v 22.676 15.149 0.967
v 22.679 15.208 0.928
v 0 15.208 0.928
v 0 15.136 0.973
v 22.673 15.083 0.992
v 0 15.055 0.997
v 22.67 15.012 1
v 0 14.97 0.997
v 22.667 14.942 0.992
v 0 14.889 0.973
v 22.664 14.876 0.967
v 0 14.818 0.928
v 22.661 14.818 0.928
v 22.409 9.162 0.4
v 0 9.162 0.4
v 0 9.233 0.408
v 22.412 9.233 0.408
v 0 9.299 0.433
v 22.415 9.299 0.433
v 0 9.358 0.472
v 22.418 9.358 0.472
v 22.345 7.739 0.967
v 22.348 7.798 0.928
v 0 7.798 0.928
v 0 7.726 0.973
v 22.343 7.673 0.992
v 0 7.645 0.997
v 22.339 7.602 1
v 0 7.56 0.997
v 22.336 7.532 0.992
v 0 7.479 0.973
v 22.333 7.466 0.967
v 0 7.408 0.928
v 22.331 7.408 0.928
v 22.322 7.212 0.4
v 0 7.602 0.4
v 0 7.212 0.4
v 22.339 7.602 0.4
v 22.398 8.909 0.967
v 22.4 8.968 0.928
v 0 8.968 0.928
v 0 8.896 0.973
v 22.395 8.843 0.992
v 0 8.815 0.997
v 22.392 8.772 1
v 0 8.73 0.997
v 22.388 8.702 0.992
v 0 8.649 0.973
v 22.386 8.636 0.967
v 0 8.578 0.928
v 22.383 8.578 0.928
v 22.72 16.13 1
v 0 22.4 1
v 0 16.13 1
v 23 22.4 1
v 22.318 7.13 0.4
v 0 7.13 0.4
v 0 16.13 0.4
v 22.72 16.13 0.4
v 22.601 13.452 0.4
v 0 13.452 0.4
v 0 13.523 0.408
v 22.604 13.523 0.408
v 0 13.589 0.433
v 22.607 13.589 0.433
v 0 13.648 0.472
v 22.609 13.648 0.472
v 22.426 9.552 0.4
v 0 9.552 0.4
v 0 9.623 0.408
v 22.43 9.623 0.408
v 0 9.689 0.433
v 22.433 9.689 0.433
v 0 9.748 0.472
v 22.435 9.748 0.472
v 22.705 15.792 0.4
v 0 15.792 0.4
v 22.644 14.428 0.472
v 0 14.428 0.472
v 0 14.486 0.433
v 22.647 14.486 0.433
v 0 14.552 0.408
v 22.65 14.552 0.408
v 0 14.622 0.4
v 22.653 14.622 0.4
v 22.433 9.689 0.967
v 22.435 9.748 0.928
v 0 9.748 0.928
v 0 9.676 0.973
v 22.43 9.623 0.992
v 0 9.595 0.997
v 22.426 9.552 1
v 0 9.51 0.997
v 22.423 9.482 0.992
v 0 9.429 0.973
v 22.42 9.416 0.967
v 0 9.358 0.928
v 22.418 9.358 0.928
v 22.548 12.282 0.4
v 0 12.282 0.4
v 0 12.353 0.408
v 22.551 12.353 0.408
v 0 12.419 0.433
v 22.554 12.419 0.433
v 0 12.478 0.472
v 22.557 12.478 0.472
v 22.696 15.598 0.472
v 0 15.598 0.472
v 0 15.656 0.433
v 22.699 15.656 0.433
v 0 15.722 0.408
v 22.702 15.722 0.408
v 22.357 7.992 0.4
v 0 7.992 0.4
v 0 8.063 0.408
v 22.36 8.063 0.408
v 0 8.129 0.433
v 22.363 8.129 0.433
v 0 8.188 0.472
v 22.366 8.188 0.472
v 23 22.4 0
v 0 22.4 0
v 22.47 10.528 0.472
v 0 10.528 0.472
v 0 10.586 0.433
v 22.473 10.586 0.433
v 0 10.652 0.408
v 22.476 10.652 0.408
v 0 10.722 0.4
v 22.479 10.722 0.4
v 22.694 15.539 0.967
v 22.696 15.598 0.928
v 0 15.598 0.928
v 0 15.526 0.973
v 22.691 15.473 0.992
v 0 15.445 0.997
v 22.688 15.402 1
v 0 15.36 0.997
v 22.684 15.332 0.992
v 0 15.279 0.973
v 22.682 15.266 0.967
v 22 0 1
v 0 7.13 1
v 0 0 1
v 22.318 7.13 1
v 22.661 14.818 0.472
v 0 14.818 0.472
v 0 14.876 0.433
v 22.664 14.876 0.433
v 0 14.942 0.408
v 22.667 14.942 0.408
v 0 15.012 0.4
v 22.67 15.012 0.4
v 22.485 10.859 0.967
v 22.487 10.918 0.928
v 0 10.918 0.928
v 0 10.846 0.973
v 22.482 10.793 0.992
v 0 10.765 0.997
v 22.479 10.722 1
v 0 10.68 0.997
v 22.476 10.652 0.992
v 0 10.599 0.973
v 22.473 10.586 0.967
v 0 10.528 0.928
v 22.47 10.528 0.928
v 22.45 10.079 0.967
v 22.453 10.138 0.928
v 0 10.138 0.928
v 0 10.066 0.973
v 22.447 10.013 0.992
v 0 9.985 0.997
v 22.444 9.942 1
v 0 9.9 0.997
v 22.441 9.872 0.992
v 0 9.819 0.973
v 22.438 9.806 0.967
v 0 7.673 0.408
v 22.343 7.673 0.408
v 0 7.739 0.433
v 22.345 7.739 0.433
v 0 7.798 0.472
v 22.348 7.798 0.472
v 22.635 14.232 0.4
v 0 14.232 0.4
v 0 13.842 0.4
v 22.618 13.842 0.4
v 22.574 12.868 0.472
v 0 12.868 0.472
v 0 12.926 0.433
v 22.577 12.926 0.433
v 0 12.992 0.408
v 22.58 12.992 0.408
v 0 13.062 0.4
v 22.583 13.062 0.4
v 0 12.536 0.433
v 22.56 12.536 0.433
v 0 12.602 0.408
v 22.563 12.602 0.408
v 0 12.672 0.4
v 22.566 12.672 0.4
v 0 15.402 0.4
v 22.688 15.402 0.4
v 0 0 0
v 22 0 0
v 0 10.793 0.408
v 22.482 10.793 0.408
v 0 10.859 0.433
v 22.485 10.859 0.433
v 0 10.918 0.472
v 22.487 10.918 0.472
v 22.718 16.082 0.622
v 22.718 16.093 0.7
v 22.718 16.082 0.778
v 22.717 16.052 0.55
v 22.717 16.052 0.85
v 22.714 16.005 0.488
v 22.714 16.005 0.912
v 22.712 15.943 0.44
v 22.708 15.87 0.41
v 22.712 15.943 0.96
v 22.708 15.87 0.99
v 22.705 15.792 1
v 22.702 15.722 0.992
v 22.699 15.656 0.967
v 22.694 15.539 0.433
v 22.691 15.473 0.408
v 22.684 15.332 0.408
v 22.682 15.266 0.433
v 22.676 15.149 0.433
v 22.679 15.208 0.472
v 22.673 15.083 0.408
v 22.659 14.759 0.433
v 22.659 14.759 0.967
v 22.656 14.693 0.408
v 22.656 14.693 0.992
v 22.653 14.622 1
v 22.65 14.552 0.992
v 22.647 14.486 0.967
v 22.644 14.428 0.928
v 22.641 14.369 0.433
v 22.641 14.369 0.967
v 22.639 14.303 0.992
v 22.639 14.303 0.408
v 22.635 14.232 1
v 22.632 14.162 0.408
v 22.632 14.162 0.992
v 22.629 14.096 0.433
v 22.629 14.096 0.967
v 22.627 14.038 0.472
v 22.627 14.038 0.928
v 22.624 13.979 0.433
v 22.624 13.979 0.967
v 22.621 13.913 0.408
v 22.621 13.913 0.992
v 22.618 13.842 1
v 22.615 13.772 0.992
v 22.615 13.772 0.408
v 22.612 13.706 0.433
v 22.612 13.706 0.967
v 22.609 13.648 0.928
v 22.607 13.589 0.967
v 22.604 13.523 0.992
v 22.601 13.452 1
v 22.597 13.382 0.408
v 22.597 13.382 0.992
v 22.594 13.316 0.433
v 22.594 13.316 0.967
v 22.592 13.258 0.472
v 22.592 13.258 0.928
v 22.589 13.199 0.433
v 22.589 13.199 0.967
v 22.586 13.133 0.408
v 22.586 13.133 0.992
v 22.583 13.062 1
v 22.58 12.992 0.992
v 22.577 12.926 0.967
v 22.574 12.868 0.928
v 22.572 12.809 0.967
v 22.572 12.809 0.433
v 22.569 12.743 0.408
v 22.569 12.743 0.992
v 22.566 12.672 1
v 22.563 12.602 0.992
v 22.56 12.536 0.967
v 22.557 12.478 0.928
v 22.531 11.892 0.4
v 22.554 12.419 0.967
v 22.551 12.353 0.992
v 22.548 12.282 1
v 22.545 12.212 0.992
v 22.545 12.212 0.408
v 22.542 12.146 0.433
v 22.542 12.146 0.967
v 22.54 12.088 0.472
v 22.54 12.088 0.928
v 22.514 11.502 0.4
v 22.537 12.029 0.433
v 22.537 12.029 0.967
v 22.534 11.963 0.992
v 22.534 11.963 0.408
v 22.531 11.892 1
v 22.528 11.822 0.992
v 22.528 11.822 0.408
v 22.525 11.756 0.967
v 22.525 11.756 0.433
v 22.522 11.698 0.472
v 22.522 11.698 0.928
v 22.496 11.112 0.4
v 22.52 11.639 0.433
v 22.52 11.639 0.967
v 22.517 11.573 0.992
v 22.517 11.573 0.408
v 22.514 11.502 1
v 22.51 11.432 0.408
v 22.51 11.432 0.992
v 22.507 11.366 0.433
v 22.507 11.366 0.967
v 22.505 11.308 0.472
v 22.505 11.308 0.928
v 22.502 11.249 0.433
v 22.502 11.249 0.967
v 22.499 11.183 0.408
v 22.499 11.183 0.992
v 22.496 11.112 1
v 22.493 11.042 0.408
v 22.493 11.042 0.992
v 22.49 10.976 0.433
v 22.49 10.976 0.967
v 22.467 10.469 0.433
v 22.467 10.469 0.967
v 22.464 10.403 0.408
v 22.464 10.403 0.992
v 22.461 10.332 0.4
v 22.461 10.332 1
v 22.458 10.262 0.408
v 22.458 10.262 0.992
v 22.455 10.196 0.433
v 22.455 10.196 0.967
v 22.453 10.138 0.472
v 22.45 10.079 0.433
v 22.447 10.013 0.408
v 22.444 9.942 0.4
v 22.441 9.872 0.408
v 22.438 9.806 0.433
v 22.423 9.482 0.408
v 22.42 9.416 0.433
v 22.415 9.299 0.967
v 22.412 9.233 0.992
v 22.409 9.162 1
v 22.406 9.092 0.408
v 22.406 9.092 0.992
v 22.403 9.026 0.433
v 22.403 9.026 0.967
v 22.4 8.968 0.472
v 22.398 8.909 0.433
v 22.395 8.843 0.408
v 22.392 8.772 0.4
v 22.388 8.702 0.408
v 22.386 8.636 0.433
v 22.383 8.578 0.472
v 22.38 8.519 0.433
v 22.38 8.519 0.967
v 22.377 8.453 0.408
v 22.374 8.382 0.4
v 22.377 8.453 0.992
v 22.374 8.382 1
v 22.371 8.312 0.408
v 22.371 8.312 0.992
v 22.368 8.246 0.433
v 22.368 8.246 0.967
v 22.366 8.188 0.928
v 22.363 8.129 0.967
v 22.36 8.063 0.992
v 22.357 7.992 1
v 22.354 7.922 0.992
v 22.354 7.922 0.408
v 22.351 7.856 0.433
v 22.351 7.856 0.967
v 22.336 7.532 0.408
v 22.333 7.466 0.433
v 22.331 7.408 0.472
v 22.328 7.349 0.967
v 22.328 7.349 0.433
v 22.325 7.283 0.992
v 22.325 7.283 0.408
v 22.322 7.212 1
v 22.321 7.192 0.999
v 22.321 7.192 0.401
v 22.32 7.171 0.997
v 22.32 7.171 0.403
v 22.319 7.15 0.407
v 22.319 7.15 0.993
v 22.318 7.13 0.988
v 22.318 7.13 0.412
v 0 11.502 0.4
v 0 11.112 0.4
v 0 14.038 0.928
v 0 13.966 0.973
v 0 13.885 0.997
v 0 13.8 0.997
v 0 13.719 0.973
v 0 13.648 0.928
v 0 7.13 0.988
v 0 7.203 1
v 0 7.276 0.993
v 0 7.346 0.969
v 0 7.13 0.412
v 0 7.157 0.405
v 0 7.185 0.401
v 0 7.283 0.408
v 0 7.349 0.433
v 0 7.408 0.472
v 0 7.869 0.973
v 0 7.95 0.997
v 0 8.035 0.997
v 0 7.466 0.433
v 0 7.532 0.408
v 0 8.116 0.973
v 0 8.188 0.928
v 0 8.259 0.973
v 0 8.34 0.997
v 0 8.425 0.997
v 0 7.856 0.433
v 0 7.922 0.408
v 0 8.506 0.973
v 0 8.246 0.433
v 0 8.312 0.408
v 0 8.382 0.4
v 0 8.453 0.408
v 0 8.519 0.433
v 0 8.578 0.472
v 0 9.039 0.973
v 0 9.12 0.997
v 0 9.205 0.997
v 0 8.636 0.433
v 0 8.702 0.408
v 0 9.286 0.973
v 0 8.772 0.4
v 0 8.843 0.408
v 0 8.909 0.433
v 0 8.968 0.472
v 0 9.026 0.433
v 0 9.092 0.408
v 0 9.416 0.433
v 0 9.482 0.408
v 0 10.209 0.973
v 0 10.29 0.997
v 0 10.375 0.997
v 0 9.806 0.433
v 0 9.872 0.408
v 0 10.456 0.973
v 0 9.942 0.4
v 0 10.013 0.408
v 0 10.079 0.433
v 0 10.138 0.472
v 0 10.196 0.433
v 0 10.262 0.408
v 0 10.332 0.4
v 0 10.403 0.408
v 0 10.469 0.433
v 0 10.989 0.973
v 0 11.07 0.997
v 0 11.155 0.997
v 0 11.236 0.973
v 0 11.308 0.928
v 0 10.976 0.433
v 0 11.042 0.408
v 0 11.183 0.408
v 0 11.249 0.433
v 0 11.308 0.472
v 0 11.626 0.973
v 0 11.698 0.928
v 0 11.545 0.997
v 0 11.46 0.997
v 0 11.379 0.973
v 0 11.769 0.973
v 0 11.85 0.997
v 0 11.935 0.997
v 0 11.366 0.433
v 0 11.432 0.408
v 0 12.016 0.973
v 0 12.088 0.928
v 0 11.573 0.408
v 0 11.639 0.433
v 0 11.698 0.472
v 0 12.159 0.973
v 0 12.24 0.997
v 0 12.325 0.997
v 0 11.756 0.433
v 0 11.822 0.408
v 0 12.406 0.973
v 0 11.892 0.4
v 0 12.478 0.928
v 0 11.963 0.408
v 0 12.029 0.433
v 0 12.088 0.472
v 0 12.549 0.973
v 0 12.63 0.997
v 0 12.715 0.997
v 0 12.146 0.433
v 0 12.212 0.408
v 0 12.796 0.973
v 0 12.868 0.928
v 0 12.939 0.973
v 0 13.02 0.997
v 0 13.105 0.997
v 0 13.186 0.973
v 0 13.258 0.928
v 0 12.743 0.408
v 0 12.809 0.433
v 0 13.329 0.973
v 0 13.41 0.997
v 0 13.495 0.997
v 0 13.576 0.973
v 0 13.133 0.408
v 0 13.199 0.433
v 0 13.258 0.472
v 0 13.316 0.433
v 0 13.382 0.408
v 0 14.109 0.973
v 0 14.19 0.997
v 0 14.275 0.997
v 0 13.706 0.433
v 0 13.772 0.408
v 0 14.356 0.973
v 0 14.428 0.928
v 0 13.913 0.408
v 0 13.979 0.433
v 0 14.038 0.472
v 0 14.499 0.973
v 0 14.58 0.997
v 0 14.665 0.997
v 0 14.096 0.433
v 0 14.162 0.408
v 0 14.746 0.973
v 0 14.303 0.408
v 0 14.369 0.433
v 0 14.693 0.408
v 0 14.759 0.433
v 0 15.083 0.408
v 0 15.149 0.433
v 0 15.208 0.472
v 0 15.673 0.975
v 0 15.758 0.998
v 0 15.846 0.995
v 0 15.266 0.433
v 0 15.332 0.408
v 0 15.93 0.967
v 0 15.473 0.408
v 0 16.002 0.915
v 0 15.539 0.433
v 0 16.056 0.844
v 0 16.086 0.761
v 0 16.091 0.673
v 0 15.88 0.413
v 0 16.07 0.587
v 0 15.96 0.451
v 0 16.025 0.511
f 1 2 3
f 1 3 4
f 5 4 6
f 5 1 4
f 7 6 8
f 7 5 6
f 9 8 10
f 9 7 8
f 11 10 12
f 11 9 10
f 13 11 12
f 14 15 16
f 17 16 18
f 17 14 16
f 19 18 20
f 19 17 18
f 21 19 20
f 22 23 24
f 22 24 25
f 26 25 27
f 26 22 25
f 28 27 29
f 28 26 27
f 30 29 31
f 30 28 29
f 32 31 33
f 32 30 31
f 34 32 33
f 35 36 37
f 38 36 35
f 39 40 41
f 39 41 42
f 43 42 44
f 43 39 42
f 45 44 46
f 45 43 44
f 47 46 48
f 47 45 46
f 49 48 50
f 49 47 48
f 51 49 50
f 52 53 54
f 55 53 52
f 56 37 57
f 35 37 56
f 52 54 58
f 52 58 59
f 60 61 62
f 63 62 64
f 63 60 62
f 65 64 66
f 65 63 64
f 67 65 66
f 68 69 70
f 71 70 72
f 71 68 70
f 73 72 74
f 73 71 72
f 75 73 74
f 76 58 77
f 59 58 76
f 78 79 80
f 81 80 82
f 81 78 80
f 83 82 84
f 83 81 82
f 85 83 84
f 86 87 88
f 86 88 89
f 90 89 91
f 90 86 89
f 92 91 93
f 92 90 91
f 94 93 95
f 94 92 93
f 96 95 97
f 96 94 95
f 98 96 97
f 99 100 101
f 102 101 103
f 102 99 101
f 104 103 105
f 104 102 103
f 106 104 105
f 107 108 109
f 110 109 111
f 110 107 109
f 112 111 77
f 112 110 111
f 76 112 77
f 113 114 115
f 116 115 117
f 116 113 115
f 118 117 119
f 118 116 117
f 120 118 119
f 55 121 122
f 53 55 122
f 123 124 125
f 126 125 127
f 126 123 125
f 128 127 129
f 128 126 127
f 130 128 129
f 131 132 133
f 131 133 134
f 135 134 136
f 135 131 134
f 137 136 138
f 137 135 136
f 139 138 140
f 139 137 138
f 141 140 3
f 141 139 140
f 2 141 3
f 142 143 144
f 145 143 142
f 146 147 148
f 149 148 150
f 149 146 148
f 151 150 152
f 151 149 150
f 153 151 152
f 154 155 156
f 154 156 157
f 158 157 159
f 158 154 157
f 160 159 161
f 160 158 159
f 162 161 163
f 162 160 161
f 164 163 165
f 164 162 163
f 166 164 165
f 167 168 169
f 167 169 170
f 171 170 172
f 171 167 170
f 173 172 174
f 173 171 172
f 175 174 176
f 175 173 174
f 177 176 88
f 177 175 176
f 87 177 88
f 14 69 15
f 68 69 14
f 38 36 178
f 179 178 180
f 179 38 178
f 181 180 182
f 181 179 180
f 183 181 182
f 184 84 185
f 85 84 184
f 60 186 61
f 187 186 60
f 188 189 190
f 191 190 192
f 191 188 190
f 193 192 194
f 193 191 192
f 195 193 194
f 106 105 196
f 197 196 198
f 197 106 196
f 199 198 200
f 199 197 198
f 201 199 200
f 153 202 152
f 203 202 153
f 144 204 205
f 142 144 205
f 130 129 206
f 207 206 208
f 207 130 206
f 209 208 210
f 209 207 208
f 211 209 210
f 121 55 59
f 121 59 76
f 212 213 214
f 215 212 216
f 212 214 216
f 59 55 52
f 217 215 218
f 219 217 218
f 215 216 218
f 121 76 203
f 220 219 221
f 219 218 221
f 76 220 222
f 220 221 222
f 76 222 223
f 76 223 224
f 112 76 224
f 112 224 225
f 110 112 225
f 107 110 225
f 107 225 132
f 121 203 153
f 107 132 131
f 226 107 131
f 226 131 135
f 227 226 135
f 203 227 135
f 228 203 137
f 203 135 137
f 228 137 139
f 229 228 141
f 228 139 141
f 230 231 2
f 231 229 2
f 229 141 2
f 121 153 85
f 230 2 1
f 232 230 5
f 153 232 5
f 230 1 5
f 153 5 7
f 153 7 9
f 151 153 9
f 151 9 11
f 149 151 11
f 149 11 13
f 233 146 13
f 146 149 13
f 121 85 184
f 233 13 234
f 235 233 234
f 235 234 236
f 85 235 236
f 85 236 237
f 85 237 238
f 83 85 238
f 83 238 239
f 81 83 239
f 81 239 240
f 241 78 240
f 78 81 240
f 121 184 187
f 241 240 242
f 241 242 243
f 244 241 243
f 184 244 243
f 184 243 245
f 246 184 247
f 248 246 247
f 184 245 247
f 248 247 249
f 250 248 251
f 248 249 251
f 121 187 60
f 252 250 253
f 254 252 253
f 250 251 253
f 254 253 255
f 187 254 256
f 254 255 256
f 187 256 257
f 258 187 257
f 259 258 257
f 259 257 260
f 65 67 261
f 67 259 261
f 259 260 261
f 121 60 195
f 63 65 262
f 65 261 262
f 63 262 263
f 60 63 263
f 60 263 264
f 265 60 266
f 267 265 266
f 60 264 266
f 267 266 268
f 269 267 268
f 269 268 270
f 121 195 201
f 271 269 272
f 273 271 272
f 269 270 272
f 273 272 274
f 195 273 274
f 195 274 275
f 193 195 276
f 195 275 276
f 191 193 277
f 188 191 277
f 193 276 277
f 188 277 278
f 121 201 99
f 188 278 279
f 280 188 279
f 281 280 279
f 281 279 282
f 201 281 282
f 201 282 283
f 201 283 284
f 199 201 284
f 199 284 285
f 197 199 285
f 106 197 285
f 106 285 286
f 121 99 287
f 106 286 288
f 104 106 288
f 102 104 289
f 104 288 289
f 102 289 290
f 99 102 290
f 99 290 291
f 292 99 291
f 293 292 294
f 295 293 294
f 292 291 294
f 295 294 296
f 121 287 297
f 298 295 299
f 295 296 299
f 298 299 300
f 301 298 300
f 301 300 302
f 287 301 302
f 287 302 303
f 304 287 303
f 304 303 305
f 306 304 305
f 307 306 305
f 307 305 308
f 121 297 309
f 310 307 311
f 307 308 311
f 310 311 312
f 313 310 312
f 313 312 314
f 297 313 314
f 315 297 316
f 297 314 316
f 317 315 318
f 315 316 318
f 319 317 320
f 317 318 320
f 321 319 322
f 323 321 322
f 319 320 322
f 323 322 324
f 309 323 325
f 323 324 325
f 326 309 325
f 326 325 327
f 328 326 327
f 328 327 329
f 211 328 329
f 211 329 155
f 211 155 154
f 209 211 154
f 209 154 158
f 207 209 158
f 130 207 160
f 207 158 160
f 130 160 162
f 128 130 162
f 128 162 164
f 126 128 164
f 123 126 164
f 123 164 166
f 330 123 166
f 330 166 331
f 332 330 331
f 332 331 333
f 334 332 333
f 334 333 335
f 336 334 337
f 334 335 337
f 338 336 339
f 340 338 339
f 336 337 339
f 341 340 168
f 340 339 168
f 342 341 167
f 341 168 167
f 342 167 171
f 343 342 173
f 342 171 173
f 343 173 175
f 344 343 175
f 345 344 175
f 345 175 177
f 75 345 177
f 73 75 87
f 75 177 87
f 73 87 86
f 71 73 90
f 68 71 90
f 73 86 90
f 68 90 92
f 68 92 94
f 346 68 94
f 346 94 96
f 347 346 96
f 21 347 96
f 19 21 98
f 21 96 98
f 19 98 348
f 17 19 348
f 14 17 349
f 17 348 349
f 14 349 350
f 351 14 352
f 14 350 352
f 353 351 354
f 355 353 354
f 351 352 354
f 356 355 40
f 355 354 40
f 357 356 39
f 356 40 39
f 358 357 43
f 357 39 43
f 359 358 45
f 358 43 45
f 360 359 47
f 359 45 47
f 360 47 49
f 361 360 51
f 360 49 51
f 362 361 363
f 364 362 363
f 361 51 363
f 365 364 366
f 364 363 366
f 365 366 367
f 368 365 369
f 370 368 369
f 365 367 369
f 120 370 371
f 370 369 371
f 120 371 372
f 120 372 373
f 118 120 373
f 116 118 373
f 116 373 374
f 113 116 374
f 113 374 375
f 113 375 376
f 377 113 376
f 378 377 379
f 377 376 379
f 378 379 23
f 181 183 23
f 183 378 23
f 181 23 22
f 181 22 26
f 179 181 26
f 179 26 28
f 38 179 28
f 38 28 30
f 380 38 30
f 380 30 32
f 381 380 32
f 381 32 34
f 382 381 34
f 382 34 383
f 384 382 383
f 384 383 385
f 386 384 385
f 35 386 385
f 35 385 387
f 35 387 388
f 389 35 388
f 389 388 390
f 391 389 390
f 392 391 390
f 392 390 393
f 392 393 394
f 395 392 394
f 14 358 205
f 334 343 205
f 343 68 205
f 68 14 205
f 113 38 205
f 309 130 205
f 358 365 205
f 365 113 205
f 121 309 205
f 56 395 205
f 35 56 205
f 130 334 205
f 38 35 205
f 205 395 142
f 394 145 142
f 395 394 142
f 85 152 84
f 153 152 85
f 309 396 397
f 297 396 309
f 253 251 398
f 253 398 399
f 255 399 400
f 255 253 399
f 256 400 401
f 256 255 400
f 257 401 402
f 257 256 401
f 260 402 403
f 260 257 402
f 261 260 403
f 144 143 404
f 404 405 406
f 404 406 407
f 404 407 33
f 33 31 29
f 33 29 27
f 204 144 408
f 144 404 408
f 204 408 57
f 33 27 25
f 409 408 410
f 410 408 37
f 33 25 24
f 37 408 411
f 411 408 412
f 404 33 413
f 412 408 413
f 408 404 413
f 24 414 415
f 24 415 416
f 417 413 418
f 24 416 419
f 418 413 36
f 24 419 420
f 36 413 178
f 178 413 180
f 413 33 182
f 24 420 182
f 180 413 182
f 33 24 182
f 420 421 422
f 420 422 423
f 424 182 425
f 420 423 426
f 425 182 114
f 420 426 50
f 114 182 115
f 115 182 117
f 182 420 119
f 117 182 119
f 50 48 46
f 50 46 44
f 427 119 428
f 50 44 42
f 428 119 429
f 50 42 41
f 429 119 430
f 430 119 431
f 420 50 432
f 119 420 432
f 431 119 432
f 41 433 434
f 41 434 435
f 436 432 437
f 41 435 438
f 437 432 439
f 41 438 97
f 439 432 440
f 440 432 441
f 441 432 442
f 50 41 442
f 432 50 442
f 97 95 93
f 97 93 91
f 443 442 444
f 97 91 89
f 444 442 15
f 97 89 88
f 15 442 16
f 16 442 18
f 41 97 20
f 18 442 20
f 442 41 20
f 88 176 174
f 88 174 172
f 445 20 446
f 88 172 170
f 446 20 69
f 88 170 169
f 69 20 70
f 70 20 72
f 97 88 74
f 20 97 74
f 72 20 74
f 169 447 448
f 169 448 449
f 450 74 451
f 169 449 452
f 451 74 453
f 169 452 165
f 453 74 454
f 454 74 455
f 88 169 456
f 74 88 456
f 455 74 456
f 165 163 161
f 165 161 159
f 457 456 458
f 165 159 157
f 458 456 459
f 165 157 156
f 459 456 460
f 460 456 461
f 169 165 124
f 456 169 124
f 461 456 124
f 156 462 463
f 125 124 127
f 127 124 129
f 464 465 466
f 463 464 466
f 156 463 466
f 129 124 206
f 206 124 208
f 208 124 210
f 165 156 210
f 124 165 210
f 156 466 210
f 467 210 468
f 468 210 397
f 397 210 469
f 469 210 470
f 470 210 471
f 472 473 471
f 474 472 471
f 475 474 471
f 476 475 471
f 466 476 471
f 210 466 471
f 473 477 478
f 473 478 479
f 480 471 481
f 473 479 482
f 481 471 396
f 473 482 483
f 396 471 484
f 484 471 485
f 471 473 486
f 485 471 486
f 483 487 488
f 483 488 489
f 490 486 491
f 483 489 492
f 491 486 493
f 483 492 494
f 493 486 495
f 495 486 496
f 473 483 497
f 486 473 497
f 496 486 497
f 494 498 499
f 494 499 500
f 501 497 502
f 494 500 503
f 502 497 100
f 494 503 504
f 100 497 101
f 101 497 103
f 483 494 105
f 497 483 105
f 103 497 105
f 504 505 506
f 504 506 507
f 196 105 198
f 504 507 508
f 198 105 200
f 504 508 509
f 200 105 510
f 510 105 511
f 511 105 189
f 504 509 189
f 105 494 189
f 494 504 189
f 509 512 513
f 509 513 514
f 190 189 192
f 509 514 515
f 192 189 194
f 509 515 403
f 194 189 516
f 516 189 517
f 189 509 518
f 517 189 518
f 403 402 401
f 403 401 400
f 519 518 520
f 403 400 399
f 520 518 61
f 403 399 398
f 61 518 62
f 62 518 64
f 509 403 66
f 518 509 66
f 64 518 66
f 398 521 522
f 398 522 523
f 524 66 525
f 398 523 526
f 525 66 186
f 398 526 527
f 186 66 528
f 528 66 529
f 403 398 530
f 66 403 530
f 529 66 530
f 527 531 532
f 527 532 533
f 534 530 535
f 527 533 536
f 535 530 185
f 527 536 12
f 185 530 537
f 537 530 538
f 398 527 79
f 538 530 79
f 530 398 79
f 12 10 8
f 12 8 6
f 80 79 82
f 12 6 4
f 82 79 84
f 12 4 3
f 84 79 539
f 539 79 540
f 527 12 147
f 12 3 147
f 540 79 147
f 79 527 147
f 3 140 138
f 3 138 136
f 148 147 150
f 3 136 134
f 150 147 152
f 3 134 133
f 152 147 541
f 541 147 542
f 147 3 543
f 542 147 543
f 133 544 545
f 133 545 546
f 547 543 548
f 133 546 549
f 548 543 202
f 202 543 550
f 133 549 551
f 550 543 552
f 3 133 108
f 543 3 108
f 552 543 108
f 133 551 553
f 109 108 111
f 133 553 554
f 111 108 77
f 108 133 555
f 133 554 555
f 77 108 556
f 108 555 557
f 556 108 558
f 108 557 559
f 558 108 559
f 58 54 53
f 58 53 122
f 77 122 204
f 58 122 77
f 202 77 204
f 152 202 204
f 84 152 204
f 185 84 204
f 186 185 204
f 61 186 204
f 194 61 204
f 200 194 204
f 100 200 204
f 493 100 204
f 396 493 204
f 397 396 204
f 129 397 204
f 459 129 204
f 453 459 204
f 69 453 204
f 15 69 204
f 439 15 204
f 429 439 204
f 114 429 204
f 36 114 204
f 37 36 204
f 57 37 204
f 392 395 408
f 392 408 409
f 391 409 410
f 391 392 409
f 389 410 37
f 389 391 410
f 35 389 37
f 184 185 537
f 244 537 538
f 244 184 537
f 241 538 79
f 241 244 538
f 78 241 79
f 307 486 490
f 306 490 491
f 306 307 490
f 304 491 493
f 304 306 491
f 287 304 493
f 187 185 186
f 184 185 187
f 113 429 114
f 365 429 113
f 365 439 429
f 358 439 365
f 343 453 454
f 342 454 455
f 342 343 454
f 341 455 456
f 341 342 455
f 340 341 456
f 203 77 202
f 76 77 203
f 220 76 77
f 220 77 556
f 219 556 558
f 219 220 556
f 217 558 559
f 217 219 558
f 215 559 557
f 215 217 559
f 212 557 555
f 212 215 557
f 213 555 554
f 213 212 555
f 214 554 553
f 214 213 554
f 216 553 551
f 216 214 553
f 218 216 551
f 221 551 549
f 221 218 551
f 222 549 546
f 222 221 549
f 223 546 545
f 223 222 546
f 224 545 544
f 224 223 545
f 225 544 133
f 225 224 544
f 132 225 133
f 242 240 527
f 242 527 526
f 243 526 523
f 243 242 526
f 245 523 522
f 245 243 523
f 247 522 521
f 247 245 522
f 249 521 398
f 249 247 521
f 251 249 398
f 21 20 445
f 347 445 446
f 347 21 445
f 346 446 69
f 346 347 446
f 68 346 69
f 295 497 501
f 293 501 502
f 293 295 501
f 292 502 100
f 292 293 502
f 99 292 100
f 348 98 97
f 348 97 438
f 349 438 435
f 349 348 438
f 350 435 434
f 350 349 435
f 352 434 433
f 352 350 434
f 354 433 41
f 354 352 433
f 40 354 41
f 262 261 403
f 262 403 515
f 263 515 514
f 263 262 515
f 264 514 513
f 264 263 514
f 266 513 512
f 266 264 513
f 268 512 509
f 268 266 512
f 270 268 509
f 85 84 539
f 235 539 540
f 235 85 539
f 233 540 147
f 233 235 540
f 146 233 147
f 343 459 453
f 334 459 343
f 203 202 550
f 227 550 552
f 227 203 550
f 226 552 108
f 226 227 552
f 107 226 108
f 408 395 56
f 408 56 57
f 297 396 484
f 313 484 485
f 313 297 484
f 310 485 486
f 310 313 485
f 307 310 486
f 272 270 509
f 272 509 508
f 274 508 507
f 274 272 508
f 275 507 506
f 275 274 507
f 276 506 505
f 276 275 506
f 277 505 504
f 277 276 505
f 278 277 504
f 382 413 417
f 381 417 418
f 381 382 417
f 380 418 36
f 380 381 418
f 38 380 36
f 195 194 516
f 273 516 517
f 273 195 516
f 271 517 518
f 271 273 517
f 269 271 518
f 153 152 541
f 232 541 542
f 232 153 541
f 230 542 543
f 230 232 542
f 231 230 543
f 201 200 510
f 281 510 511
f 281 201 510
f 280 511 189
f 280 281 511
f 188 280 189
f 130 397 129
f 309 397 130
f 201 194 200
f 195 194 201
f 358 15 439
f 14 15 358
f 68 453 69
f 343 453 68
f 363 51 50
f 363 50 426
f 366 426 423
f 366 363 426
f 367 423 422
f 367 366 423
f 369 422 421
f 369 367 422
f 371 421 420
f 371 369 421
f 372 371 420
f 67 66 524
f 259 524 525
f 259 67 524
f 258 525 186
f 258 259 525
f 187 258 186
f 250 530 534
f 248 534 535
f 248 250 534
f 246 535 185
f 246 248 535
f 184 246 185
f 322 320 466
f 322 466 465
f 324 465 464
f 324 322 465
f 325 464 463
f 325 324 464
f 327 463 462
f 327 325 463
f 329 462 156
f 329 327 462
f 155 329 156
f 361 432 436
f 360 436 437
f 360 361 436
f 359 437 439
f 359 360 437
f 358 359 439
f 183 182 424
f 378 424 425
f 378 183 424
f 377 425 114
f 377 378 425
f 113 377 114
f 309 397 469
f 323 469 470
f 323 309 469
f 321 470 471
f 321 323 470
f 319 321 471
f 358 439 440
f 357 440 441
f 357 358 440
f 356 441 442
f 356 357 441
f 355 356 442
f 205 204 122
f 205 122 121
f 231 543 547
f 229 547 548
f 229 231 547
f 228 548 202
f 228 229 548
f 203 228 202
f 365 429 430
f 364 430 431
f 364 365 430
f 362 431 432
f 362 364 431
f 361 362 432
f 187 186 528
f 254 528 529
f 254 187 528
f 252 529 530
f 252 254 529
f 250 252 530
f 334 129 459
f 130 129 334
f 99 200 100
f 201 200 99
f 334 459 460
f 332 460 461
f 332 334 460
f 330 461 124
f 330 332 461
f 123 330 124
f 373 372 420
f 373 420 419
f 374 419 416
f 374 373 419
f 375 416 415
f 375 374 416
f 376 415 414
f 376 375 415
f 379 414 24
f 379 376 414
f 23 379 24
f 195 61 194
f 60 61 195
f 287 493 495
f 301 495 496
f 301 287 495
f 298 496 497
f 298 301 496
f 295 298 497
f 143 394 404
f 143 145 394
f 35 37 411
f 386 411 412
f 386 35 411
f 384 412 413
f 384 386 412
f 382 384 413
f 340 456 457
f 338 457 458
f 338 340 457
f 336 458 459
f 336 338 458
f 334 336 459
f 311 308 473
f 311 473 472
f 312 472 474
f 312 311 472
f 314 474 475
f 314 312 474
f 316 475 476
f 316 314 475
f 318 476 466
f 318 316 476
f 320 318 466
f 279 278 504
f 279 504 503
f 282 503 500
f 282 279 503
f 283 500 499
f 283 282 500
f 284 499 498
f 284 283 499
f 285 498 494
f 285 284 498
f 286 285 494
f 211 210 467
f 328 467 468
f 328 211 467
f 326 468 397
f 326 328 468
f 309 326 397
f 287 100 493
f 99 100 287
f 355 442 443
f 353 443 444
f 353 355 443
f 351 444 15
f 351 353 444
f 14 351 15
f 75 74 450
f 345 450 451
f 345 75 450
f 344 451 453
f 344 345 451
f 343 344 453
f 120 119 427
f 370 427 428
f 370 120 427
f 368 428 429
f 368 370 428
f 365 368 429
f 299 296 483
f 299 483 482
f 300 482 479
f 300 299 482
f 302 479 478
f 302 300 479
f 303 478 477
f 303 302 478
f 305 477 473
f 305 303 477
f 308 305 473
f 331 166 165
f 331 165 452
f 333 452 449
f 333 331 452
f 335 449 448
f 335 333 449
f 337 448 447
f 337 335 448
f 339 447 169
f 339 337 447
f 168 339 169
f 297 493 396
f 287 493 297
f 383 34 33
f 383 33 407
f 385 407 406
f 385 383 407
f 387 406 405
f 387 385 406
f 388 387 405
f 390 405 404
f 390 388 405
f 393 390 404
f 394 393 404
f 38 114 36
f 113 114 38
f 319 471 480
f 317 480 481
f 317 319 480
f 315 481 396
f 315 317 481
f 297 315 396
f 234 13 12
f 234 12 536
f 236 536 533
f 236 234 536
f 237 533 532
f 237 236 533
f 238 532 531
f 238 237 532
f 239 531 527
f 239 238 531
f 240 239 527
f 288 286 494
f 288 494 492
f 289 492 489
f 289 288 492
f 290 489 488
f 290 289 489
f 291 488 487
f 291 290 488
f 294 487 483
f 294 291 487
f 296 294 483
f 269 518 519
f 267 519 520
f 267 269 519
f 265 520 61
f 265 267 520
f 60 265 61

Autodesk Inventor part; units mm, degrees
ref_plane "YZ Plane" through (0, 0, 0) normal (1, 0, 0) x (0, 1, 0)
ref_plane "XZ Plane" through (0, 0, 0) normal (0, 1, 0) x (-1, 0, 0)
ref_plane "XY Plane" through (0, 0, 0) normal (0, 0, 1) x (1, 0, 0)
sketch "Sketch1" plane through (0, 0, 0) normal (0, 0, 1) x (1, 0, 0)
  line L0 (0, 0) -> (23, 0)
  line L1 (23, 0) -> (23, 22.4)
  line L2 (23, 22.4) -> (0, 22.4)
  line L3 (0, 22.4) -> (0, 0)
  dimension "d0" = 23
  dimension "d1" = 22.4
extrude "Extrusion1" add sketch "Sketch1" along normal blind 1
sketch "Sketch2" plane through (0, 0, 1) normal (0, 0, 1) x (1, 0, 0)
  line L0 (0, 0) -> (23, 0) projected
  line L1 (23, 0) -> (23, 22.4) projected
  line L2 (23, 22.4) -> (0, 22.4) projected
  line L3 (0, 22.4) -> (0, 0) projected
  line L4 (23, 0) -> (23, 22.4) projected
  line L5 (0, 16.13) -> (23, 16.13)
  line L6 (23, 16.13) -> (23, 7.13)
  line L7 (23, 7.13) -> (0, 7.13)
  line L8 (0, 7.13) -> (0, 16.13)
  dimension "d4" = 9
  dimension "d5" = 6.27
extrude "Extrusion2" cut sketch "Sketch2" against normal blind 0.6 contours L3 L5 L1 L7
sketch "Sketch3" plane through (23, 0, 0) normal (1, 0, 0) x (0, 0, -1)
  line L0 (-1, 0) -> (-1, 7.13) projected
  line L1 (0, 0) -> (-1, 0) projected
  line L2 (0, 0) -> (0, 22.4) projected
  line L3 (0, 22.4) -> (-1, 22.4) projected
  circle A0 centre (-0.7, 15.7925) radius 0.3
  line L4 (-0.4, 16.13) -> (-0.4, 7.13) projected
  line L5 (-0.4, 7.13) -> (-1, 7.13) projected
  line L6 (-1, 16.13) -> (-1, 22.4) projected
  line L7 (-1, 16.13) -> (-0.4, 16.13) projected
  line L8 (-0.4, 16.13) -> (-0.4, 7.13) projected
extrude "Extrusion3" add sketch "Sketch3" against normal up to surface (23 mm away) contours A0
pattern_linear "Rectangular Pattern1" count 24 spacing 0.39 along (0, -1, 0) of "Extrusion3"
sketch "Sketch4" plane through (0, 0, 1) normal (0, 0, 1) x (1, 0, 0)
  line L0 (0, 7.13) -> (0, 0) projected
  line L1 (0, 0) -> (23, 0) projected
  line L2 (23, 0) -> (23, 7.13) projected
  line L3 (23, 7.13) -> (0, 7.13) projected
  line L4 (23, 22.4) -> (22, 0)
  line L5 (0, 0) -> (23, 0) projected
  line L6 (22, 0) -> (23, 0)
  line L7 (23, 16.13) -> (23, 22.4) projected
  line L8 (23, 0) -> (23, 22.4)
  dimension "d16" = 1
extrude "Extrusion4" cut sketch "Sketch4" along normal through all both and the other way through all contours L4 L7 L8 L3 | L3 L2 L1 L4
properties part number "00_chip_01_old"
